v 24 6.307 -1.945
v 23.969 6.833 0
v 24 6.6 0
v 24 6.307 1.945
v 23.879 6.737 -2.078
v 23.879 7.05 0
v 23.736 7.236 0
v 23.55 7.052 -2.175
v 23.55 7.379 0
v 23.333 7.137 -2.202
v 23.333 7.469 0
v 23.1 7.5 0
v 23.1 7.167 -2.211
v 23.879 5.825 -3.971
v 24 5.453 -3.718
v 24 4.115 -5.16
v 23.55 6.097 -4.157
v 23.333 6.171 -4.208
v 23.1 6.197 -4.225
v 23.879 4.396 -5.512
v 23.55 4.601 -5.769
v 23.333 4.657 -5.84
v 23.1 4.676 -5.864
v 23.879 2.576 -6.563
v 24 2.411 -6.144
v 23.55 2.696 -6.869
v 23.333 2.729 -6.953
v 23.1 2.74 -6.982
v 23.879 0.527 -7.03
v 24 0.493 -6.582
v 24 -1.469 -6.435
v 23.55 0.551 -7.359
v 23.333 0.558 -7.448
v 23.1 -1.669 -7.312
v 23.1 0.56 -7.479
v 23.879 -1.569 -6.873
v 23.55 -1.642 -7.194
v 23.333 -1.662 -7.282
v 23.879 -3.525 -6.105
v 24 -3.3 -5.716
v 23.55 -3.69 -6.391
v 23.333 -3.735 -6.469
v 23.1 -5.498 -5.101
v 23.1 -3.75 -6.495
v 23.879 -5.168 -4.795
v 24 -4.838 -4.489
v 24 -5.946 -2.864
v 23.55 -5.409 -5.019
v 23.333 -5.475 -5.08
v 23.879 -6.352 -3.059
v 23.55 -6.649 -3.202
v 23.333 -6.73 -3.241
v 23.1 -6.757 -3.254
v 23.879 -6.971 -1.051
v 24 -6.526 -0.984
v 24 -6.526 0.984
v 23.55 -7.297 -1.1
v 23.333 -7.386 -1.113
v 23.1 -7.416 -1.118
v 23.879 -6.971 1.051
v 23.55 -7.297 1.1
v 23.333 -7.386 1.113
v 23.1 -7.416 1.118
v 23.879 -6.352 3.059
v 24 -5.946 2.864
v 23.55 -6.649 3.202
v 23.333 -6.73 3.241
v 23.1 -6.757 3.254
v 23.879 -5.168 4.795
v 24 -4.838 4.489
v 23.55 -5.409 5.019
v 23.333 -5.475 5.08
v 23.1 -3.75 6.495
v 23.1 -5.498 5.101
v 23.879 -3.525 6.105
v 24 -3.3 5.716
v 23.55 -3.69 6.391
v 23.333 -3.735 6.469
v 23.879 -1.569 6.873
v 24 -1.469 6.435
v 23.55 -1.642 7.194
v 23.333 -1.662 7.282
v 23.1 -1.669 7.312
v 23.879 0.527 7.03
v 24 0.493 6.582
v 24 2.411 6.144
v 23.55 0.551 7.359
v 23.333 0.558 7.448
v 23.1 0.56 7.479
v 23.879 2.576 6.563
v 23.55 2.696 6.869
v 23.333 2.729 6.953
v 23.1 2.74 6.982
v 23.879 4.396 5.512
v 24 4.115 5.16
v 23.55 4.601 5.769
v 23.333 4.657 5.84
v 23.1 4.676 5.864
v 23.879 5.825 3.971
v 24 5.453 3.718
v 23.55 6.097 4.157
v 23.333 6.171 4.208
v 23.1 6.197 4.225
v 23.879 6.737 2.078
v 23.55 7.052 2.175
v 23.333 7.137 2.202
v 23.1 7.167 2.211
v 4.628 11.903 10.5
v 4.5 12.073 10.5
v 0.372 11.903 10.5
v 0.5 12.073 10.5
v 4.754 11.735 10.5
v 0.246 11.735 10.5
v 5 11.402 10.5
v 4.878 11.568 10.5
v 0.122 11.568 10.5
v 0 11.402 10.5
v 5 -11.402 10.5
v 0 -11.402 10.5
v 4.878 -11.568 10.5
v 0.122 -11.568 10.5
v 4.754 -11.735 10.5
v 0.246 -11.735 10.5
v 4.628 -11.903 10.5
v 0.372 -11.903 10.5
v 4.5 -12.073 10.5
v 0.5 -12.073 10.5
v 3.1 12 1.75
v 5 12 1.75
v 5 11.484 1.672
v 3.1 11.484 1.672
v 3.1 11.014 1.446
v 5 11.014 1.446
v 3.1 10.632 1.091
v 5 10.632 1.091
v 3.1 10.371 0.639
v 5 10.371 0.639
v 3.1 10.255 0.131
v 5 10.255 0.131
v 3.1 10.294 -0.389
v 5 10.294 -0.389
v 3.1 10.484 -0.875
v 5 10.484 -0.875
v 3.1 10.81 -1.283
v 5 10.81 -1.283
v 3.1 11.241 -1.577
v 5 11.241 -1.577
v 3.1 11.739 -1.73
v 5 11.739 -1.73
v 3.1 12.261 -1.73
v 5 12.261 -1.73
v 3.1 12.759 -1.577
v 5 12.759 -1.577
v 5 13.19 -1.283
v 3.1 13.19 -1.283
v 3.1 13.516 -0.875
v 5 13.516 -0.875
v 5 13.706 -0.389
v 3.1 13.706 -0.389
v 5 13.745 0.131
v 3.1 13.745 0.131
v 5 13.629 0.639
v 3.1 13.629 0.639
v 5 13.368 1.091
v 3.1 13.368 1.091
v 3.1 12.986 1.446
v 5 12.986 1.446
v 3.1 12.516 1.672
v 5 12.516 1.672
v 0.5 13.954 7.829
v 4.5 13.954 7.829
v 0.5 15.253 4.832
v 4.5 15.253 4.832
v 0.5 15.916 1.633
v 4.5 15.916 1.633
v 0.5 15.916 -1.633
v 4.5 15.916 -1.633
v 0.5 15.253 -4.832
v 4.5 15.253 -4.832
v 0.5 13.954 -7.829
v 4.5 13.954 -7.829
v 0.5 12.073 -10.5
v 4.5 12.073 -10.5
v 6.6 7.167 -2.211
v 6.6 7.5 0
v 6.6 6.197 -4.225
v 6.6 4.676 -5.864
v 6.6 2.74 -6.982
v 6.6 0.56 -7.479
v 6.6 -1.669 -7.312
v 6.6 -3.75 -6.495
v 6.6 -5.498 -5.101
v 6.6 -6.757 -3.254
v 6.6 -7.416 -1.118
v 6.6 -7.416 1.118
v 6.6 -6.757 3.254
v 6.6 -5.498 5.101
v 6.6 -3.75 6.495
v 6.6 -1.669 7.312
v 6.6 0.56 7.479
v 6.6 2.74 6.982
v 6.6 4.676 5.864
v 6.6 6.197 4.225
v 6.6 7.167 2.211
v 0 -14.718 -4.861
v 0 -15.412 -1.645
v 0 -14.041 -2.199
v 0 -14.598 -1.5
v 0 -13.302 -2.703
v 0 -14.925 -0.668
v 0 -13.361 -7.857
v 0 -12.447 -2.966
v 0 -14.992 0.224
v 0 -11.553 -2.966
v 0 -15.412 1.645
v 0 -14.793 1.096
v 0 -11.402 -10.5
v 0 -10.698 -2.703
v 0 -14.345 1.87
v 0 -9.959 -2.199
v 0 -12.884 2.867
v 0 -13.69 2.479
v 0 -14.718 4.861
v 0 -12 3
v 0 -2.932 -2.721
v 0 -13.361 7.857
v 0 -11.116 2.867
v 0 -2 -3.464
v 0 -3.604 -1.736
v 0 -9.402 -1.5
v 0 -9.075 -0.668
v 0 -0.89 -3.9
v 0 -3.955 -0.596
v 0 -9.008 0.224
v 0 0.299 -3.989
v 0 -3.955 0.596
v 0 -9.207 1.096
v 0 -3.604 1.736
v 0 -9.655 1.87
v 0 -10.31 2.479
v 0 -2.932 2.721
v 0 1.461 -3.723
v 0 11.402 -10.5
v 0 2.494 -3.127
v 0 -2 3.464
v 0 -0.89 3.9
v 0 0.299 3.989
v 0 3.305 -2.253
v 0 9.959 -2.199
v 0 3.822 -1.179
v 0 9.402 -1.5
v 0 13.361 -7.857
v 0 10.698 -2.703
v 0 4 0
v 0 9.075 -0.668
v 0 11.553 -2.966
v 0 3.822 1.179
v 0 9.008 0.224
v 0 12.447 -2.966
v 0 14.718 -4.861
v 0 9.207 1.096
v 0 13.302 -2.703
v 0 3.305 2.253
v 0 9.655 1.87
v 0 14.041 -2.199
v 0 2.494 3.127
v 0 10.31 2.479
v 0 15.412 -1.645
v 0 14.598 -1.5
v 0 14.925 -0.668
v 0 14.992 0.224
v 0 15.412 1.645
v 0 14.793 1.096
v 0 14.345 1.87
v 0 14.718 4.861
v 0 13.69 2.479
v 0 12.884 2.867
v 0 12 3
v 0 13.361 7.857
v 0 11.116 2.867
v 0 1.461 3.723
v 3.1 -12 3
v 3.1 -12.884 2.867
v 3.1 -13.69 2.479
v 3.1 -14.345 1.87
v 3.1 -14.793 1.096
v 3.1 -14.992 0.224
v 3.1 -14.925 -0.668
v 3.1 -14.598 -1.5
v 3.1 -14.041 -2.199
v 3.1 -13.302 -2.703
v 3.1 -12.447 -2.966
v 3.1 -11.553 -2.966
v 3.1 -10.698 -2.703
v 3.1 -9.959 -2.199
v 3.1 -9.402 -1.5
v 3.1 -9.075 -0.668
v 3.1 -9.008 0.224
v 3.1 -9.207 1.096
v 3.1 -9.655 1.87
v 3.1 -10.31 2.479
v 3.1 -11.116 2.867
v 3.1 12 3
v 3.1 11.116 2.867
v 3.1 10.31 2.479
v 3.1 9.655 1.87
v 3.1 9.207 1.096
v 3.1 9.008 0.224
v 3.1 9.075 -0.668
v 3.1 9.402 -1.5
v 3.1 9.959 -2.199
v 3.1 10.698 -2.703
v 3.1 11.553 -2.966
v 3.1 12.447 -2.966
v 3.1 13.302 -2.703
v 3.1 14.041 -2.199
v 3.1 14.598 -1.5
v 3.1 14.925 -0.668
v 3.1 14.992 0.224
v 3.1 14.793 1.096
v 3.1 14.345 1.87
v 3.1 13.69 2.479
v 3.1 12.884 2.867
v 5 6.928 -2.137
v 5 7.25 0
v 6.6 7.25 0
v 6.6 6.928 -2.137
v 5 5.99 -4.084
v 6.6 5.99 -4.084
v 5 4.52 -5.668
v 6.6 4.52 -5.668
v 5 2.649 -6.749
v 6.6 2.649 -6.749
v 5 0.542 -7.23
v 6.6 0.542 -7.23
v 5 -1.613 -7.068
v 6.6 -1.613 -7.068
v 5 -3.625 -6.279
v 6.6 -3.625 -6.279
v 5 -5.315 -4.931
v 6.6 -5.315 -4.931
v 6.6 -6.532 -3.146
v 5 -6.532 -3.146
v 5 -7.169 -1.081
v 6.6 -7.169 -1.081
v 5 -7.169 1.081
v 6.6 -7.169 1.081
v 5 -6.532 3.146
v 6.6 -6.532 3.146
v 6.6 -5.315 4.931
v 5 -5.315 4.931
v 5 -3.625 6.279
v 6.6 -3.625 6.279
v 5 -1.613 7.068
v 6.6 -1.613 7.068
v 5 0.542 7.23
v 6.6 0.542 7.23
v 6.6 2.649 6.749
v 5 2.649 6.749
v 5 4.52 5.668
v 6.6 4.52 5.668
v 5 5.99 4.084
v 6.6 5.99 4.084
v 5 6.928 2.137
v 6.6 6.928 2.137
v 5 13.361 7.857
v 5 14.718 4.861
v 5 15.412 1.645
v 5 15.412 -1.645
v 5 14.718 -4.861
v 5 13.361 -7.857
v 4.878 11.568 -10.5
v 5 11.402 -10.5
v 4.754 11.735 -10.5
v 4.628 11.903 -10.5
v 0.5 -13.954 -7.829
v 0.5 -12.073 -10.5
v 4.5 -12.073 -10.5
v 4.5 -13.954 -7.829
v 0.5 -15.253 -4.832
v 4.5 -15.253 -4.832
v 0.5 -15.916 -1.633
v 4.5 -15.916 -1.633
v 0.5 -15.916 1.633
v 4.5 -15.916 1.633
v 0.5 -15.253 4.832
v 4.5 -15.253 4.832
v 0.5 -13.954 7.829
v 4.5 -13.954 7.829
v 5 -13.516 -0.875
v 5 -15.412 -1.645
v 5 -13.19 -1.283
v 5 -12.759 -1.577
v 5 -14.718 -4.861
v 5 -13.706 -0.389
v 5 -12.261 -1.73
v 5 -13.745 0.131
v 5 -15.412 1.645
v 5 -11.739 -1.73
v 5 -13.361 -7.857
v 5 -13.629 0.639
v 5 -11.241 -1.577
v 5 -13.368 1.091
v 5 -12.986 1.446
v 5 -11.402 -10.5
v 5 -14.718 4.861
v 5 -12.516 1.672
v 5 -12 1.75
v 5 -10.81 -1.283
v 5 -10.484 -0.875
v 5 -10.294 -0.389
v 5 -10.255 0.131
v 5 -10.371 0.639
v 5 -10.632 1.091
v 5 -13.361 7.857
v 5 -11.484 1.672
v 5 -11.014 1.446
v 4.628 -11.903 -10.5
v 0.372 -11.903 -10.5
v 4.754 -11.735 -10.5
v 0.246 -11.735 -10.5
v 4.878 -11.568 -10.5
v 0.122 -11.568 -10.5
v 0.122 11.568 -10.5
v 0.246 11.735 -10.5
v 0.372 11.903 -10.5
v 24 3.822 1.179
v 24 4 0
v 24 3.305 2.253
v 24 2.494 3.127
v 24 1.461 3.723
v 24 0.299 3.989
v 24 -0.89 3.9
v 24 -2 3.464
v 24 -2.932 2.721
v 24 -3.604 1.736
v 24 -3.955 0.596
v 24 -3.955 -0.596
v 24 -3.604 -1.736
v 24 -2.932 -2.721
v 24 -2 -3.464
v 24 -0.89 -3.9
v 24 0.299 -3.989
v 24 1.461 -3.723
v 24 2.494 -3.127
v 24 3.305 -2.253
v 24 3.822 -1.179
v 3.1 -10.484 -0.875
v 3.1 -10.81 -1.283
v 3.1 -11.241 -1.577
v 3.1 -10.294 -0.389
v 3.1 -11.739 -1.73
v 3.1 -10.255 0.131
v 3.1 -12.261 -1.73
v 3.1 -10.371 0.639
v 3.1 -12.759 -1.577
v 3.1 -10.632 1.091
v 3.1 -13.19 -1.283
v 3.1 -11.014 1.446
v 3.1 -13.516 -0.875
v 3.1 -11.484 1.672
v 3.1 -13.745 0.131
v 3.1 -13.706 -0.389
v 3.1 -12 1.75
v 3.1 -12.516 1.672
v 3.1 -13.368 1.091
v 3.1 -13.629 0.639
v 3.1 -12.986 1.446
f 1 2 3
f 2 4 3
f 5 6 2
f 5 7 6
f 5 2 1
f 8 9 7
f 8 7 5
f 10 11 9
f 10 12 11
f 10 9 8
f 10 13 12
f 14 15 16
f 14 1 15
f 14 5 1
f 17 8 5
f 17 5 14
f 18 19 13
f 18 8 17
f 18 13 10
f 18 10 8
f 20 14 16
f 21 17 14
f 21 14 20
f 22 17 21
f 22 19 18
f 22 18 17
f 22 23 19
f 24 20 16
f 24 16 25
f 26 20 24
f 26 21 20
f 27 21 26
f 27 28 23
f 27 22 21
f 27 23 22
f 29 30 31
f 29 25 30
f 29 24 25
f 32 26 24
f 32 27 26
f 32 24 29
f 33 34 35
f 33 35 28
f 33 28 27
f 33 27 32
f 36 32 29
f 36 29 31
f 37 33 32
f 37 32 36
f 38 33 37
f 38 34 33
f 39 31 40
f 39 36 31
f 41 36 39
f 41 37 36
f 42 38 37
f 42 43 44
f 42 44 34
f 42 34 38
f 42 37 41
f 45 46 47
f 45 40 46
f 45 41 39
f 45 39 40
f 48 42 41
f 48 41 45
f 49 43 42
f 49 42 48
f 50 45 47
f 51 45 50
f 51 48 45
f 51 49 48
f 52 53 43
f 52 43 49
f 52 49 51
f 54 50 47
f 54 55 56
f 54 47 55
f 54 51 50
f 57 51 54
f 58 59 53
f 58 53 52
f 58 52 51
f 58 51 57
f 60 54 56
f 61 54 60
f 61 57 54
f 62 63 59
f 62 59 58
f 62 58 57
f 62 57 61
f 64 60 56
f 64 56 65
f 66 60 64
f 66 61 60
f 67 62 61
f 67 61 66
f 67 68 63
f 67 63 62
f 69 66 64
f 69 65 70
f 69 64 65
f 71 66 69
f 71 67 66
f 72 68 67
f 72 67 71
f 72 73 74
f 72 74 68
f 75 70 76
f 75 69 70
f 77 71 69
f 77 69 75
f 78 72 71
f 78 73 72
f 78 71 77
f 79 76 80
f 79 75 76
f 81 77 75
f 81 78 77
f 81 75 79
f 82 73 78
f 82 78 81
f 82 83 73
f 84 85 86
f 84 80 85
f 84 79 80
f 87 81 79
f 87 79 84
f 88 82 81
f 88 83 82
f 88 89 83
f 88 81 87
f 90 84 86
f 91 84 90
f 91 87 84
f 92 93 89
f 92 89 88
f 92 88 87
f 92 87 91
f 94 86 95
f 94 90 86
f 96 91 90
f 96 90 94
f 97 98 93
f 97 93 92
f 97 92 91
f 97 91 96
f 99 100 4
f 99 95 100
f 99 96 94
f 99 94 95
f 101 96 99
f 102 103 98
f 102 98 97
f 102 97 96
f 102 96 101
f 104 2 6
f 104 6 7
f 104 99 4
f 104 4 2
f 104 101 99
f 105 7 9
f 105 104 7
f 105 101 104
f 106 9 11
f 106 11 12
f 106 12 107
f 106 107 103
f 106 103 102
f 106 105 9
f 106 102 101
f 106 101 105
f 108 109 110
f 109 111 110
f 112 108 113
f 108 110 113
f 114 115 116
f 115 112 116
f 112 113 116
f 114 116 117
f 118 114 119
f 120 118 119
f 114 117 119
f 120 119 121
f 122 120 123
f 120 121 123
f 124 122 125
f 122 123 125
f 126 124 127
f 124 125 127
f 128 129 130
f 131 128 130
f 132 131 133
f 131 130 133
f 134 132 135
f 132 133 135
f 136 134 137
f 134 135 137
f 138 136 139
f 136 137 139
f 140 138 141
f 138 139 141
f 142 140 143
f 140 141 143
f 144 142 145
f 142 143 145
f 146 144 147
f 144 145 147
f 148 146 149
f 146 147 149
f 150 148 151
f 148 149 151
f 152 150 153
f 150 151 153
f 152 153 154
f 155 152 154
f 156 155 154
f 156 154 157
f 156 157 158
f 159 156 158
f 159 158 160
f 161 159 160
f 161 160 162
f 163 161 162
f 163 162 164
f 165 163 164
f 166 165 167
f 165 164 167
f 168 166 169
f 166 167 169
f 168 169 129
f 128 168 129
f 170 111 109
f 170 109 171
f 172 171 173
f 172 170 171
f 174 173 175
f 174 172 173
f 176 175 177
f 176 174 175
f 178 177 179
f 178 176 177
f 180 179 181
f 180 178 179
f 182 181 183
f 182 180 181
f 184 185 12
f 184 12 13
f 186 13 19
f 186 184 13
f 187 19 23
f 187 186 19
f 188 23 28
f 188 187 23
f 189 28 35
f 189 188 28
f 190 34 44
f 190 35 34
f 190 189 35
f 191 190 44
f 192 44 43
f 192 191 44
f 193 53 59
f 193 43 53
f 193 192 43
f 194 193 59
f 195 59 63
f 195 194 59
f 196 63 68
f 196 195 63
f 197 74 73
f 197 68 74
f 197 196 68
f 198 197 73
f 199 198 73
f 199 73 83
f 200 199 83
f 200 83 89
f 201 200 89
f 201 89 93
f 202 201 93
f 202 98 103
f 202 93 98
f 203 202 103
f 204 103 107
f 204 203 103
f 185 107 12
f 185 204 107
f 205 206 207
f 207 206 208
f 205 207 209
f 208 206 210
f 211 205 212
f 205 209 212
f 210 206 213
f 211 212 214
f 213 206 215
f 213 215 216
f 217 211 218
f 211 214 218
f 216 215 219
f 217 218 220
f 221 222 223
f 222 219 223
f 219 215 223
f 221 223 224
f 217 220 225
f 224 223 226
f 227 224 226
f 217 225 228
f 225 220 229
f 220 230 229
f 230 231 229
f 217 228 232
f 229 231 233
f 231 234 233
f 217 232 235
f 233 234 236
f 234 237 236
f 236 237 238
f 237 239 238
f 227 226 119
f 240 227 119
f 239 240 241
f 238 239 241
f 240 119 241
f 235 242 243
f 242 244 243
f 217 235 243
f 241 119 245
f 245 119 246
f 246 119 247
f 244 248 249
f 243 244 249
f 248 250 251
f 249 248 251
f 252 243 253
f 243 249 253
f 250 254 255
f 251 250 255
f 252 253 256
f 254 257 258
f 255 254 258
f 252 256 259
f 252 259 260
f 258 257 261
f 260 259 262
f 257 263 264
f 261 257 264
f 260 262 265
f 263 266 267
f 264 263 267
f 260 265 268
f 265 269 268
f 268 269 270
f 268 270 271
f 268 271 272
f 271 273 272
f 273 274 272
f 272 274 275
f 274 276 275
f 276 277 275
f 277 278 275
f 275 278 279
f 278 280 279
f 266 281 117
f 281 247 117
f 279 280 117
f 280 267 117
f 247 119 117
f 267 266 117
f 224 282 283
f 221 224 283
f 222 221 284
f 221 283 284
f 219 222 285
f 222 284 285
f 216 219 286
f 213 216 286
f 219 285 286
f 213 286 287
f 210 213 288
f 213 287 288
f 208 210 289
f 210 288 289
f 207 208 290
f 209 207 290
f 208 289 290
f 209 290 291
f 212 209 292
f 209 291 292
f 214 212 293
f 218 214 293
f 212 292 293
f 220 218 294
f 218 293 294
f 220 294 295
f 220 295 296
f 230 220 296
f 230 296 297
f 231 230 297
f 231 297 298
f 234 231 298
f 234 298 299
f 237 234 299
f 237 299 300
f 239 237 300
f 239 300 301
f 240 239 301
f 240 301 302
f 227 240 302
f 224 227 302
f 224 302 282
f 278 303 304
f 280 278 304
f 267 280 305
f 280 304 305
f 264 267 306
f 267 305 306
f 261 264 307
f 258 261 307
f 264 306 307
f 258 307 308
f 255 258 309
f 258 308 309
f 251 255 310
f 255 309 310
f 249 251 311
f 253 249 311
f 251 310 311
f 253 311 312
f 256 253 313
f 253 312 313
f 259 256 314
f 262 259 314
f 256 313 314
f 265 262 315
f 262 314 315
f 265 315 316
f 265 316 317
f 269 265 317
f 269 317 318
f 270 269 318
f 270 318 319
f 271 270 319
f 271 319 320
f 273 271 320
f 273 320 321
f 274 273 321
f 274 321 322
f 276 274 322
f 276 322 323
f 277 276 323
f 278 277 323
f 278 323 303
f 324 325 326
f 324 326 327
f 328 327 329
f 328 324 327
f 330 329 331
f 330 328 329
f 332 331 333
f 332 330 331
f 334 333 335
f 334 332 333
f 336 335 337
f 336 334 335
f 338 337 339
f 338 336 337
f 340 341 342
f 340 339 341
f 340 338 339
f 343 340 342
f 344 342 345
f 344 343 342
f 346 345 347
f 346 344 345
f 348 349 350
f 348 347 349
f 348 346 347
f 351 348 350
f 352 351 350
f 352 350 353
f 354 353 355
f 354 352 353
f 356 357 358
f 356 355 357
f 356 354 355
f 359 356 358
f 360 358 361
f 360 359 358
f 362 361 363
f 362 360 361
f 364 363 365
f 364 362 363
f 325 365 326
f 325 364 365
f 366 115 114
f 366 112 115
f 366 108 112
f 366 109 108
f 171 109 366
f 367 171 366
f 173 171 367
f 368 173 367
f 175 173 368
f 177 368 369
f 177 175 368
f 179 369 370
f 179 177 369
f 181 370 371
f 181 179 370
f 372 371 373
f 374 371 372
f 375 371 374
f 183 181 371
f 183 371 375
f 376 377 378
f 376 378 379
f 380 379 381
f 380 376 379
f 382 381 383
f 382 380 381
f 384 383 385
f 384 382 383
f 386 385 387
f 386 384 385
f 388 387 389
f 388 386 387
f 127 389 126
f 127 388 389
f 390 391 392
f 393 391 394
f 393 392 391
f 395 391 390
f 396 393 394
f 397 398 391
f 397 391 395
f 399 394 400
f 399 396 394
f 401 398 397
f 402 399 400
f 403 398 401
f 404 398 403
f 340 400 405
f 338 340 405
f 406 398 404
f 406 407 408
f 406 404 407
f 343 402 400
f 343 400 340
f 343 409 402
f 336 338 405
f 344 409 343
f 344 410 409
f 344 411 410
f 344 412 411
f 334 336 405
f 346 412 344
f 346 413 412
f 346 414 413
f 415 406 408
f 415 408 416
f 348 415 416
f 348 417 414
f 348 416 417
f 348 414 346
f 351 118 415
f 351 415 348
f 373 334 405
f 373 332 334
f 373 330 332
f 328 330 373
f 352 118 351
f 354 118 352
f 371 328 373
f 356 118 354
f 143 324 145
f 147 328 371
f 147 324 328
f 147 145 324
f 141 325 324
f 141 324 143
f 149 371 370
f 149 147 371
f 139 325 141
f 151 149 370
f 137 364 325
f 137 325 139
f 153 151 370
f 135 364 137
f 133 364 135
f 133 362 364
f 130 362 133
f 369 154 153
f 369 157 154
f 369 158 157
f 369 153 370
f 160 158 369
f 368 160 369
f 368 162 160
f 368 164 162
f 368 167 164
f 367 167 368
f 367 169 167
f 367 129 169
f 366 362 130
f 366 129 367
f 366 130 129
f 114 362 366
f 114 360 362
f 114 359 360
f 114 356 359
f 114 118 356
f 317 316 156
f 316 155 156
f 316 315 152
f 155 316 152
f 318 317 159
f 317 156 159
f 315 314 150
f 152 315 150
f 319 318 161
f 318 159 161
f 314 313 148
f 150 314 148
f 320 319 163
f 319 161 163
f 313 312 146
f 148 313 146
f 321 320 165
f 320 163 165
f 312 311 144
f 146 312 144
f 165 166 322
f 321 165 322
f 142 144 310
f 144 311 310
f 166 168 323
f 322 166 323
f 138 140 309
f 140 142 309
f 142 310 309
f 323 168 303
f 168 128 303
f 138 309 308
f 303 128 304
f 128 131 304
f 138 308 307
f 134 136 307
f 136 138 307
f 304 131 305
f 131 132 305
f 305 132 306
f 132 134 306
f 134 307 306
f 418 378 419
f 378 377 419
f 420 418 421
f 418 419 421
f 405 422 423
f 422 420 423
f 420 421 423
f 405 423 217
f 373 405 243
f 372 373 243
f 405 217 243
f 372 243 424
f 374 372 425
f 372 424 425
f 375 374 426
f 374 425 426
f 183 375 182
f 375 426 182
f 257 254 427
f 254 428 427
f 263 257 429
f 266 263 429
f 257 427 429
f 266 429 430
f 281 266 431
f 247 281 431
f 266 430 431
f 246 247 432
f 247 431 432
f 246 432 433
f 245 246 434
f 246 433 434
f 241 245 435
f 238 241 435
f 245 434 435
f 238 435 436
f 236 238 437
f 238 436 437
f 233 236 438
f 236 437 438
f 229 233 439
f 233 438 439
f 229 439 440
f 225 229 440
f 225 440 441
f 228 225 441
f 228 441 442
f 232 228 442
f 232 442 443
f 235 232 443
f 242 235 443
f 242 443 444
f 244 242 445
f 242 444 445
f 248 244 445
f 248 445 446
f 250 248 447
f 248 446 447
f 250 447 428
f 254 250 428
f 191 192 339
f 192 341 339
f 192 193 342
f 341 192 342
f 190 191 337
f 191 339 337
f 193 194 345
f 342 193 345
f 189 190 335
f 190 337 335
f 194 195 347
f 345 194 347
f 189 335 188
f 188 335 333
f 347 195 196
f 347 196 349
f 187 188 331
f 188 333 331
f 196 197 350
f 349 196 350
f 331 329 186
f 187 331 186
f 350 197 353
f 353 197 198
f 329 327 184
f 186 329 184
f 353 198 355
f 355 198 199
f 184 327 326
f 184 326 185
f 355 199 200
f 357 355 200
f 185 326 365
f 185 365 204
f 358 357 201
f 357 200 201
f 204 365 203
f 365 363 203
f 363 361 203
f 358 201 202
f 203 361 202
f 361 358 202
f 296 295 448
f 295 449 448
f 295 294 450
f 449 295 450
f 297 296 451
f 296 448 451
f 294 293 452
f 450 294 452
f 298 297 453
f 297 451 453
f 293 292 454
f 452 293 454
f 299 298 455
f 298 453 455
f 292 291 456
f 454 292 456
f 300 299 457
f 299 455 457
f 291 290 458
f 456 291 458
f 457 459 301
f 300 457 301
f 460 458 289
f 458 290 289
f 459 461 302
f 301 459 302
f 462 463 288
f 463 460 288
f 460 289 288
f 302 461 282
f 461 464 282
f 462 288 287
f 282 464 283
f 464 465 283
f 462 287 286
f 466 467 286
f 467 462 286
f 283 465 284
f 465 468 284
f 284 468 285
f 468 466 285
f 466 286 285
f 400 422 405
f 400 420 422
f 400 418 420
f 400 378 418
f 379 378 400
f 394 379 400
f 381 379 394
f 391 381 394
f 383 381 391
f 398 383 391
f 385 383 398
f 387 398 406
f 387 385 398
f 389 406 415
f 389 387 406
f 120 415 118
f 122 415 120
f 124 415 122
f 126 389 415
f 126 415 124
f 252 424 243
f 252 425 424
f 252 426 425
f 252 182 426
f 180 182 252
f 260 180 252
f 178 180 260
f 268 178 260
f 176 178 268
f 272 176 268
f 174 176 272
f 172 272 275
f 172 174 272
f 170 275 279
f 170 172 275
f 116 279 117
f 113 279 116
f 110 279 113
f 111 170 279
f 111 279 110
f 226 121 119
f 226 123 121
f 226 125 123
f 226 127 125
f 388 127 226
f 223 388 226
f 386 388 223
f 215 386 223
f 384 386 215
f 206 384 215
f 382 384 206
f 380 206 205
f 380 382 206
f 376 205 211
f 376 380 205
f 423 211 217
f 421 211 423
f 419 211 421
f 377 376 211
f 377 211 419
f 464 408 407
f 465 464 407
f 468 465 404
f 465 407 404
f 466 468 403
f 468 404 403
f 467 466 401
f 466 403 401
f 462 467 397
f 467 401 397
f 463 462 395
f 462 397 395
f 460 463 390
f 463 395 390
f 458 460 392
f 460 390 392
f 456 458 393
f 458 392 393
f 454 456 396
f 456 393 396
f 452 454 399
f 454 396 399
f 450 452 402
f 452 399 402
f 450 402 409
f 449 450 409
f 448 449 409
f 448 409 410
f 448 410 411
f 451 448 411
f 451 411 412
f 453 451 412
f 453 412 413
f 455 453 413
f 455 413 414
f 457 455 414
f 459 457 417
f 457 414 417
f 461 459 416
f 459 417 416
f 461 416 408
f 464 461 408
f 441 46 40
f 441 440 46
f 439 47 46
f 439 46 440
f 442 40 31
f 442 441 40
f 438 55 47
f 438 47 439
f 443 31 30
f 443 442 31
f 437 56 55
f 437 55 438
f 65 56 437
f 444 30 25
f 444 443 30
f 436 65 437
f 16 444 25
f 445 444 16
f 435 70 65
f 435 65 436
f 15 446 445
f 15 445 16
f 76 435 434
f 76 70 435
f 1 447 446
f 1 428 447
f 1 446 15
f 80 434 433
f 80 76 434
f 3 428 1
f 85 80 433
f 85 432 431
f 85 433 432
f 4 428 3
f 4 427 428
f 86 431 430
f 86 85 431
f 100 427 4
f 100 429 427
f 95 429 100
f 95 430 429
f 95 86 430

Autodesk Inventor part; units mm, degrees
sketch "Sketch_1" plane through (0, 0, 0) normal (0, 0, 1) x (1, 0, 0)
  line L0 (24, 0) -> (0, 0)
  line L1 (0, 4) -> (24, 4)
  line L2 (24, 4) -> (24, 6.6)
  arc A0 (24, 6.6) -> (23.1, 7.5) centre (23.1, 6.6) ccw
  line L3 (23.1, 7.5) -> (6.6, 7.5)
  line L4 (6.6, 7.5) -> (6.6, 7.25)
  line L5 (6.6, 7.25) -> (5, 7.25)
  line L6 (5, 7.25) -> (5, 15.5)
  line L7 (5, 15.5) -> (4.5, 16)
  line L8 (4.5, 16) -> (0.5, 16)
  line L9 (0.5, 16) -> (0, 15.5)
  line L10 (0, 15.5) -> (0, 4)
revolve "Revolution1" add sketch "Sketch_1" angle 360 about axis through (24, 0, 0) along (1, 0, 0)
sketch "Sketch_3" plane through (0, 0, 0) normal (1, 0, 0) x (0, 1, 0)
  line L0 (-32, 32) -> (-32, -32)
  line L1 (-32, -32) -> (32, -32)
  line L2 (32, -32) -> (32, 32)
  line L3 (32, 32) -> (-32, 32)
  line L4 (12.0727, 10.5) -> (-12.0727, 10.5)
  arc A0 (-12.0727, 10.5) -> (-12.0727, -10.5) centre (0, 0) ccw
  line L5 (-12.0727, -10.5) -> (12.0727, -10.5)
  arc A1 (12.0727, -10.5) -> (12.0727, 10.5) centre (0, 0) ccw
extrude "Extrusion1" cut sketch "Sketch_3" along normal blind 5
sketch "Sketch3" plane through (0, -11.4018, -10.5) normal (-1, 0, 0) x (0, 0, 1)
  point P0 (10.5, 23.4018)
hole "Hole1" at (0, 12, 0) direction (1, 0, 0) diameter 3.5 depth 5 counterbore diameter 6 counterbore depth 3.1
sketch "Sketch4" plane through (0, -11.4018, -10.5) normal (-1, 0, 0) x (0, 0, 1)
  point P0 (10.5, -0.5982)
hole "Hole2" at (0, -12, 0) direction (1, 0, 0) diameter 3.5 depth 5 counterbore diameter 6 counterbore depth 3.1
ref_plane "Combination_Module_XY" through (0, 0, 0) normal (1, 0, 0) x (0, 0, -1)
ref_plane "Combination_Module_YZ" through (0, 0, 0) normal (0, 0, -1) x (0, 1, 0)
ref_plane "Combination_Module_ZX" through (0, 0, 0) normal (0, 1, 0) x (1, 0, 0)
properties part number "C-LHFC8"
